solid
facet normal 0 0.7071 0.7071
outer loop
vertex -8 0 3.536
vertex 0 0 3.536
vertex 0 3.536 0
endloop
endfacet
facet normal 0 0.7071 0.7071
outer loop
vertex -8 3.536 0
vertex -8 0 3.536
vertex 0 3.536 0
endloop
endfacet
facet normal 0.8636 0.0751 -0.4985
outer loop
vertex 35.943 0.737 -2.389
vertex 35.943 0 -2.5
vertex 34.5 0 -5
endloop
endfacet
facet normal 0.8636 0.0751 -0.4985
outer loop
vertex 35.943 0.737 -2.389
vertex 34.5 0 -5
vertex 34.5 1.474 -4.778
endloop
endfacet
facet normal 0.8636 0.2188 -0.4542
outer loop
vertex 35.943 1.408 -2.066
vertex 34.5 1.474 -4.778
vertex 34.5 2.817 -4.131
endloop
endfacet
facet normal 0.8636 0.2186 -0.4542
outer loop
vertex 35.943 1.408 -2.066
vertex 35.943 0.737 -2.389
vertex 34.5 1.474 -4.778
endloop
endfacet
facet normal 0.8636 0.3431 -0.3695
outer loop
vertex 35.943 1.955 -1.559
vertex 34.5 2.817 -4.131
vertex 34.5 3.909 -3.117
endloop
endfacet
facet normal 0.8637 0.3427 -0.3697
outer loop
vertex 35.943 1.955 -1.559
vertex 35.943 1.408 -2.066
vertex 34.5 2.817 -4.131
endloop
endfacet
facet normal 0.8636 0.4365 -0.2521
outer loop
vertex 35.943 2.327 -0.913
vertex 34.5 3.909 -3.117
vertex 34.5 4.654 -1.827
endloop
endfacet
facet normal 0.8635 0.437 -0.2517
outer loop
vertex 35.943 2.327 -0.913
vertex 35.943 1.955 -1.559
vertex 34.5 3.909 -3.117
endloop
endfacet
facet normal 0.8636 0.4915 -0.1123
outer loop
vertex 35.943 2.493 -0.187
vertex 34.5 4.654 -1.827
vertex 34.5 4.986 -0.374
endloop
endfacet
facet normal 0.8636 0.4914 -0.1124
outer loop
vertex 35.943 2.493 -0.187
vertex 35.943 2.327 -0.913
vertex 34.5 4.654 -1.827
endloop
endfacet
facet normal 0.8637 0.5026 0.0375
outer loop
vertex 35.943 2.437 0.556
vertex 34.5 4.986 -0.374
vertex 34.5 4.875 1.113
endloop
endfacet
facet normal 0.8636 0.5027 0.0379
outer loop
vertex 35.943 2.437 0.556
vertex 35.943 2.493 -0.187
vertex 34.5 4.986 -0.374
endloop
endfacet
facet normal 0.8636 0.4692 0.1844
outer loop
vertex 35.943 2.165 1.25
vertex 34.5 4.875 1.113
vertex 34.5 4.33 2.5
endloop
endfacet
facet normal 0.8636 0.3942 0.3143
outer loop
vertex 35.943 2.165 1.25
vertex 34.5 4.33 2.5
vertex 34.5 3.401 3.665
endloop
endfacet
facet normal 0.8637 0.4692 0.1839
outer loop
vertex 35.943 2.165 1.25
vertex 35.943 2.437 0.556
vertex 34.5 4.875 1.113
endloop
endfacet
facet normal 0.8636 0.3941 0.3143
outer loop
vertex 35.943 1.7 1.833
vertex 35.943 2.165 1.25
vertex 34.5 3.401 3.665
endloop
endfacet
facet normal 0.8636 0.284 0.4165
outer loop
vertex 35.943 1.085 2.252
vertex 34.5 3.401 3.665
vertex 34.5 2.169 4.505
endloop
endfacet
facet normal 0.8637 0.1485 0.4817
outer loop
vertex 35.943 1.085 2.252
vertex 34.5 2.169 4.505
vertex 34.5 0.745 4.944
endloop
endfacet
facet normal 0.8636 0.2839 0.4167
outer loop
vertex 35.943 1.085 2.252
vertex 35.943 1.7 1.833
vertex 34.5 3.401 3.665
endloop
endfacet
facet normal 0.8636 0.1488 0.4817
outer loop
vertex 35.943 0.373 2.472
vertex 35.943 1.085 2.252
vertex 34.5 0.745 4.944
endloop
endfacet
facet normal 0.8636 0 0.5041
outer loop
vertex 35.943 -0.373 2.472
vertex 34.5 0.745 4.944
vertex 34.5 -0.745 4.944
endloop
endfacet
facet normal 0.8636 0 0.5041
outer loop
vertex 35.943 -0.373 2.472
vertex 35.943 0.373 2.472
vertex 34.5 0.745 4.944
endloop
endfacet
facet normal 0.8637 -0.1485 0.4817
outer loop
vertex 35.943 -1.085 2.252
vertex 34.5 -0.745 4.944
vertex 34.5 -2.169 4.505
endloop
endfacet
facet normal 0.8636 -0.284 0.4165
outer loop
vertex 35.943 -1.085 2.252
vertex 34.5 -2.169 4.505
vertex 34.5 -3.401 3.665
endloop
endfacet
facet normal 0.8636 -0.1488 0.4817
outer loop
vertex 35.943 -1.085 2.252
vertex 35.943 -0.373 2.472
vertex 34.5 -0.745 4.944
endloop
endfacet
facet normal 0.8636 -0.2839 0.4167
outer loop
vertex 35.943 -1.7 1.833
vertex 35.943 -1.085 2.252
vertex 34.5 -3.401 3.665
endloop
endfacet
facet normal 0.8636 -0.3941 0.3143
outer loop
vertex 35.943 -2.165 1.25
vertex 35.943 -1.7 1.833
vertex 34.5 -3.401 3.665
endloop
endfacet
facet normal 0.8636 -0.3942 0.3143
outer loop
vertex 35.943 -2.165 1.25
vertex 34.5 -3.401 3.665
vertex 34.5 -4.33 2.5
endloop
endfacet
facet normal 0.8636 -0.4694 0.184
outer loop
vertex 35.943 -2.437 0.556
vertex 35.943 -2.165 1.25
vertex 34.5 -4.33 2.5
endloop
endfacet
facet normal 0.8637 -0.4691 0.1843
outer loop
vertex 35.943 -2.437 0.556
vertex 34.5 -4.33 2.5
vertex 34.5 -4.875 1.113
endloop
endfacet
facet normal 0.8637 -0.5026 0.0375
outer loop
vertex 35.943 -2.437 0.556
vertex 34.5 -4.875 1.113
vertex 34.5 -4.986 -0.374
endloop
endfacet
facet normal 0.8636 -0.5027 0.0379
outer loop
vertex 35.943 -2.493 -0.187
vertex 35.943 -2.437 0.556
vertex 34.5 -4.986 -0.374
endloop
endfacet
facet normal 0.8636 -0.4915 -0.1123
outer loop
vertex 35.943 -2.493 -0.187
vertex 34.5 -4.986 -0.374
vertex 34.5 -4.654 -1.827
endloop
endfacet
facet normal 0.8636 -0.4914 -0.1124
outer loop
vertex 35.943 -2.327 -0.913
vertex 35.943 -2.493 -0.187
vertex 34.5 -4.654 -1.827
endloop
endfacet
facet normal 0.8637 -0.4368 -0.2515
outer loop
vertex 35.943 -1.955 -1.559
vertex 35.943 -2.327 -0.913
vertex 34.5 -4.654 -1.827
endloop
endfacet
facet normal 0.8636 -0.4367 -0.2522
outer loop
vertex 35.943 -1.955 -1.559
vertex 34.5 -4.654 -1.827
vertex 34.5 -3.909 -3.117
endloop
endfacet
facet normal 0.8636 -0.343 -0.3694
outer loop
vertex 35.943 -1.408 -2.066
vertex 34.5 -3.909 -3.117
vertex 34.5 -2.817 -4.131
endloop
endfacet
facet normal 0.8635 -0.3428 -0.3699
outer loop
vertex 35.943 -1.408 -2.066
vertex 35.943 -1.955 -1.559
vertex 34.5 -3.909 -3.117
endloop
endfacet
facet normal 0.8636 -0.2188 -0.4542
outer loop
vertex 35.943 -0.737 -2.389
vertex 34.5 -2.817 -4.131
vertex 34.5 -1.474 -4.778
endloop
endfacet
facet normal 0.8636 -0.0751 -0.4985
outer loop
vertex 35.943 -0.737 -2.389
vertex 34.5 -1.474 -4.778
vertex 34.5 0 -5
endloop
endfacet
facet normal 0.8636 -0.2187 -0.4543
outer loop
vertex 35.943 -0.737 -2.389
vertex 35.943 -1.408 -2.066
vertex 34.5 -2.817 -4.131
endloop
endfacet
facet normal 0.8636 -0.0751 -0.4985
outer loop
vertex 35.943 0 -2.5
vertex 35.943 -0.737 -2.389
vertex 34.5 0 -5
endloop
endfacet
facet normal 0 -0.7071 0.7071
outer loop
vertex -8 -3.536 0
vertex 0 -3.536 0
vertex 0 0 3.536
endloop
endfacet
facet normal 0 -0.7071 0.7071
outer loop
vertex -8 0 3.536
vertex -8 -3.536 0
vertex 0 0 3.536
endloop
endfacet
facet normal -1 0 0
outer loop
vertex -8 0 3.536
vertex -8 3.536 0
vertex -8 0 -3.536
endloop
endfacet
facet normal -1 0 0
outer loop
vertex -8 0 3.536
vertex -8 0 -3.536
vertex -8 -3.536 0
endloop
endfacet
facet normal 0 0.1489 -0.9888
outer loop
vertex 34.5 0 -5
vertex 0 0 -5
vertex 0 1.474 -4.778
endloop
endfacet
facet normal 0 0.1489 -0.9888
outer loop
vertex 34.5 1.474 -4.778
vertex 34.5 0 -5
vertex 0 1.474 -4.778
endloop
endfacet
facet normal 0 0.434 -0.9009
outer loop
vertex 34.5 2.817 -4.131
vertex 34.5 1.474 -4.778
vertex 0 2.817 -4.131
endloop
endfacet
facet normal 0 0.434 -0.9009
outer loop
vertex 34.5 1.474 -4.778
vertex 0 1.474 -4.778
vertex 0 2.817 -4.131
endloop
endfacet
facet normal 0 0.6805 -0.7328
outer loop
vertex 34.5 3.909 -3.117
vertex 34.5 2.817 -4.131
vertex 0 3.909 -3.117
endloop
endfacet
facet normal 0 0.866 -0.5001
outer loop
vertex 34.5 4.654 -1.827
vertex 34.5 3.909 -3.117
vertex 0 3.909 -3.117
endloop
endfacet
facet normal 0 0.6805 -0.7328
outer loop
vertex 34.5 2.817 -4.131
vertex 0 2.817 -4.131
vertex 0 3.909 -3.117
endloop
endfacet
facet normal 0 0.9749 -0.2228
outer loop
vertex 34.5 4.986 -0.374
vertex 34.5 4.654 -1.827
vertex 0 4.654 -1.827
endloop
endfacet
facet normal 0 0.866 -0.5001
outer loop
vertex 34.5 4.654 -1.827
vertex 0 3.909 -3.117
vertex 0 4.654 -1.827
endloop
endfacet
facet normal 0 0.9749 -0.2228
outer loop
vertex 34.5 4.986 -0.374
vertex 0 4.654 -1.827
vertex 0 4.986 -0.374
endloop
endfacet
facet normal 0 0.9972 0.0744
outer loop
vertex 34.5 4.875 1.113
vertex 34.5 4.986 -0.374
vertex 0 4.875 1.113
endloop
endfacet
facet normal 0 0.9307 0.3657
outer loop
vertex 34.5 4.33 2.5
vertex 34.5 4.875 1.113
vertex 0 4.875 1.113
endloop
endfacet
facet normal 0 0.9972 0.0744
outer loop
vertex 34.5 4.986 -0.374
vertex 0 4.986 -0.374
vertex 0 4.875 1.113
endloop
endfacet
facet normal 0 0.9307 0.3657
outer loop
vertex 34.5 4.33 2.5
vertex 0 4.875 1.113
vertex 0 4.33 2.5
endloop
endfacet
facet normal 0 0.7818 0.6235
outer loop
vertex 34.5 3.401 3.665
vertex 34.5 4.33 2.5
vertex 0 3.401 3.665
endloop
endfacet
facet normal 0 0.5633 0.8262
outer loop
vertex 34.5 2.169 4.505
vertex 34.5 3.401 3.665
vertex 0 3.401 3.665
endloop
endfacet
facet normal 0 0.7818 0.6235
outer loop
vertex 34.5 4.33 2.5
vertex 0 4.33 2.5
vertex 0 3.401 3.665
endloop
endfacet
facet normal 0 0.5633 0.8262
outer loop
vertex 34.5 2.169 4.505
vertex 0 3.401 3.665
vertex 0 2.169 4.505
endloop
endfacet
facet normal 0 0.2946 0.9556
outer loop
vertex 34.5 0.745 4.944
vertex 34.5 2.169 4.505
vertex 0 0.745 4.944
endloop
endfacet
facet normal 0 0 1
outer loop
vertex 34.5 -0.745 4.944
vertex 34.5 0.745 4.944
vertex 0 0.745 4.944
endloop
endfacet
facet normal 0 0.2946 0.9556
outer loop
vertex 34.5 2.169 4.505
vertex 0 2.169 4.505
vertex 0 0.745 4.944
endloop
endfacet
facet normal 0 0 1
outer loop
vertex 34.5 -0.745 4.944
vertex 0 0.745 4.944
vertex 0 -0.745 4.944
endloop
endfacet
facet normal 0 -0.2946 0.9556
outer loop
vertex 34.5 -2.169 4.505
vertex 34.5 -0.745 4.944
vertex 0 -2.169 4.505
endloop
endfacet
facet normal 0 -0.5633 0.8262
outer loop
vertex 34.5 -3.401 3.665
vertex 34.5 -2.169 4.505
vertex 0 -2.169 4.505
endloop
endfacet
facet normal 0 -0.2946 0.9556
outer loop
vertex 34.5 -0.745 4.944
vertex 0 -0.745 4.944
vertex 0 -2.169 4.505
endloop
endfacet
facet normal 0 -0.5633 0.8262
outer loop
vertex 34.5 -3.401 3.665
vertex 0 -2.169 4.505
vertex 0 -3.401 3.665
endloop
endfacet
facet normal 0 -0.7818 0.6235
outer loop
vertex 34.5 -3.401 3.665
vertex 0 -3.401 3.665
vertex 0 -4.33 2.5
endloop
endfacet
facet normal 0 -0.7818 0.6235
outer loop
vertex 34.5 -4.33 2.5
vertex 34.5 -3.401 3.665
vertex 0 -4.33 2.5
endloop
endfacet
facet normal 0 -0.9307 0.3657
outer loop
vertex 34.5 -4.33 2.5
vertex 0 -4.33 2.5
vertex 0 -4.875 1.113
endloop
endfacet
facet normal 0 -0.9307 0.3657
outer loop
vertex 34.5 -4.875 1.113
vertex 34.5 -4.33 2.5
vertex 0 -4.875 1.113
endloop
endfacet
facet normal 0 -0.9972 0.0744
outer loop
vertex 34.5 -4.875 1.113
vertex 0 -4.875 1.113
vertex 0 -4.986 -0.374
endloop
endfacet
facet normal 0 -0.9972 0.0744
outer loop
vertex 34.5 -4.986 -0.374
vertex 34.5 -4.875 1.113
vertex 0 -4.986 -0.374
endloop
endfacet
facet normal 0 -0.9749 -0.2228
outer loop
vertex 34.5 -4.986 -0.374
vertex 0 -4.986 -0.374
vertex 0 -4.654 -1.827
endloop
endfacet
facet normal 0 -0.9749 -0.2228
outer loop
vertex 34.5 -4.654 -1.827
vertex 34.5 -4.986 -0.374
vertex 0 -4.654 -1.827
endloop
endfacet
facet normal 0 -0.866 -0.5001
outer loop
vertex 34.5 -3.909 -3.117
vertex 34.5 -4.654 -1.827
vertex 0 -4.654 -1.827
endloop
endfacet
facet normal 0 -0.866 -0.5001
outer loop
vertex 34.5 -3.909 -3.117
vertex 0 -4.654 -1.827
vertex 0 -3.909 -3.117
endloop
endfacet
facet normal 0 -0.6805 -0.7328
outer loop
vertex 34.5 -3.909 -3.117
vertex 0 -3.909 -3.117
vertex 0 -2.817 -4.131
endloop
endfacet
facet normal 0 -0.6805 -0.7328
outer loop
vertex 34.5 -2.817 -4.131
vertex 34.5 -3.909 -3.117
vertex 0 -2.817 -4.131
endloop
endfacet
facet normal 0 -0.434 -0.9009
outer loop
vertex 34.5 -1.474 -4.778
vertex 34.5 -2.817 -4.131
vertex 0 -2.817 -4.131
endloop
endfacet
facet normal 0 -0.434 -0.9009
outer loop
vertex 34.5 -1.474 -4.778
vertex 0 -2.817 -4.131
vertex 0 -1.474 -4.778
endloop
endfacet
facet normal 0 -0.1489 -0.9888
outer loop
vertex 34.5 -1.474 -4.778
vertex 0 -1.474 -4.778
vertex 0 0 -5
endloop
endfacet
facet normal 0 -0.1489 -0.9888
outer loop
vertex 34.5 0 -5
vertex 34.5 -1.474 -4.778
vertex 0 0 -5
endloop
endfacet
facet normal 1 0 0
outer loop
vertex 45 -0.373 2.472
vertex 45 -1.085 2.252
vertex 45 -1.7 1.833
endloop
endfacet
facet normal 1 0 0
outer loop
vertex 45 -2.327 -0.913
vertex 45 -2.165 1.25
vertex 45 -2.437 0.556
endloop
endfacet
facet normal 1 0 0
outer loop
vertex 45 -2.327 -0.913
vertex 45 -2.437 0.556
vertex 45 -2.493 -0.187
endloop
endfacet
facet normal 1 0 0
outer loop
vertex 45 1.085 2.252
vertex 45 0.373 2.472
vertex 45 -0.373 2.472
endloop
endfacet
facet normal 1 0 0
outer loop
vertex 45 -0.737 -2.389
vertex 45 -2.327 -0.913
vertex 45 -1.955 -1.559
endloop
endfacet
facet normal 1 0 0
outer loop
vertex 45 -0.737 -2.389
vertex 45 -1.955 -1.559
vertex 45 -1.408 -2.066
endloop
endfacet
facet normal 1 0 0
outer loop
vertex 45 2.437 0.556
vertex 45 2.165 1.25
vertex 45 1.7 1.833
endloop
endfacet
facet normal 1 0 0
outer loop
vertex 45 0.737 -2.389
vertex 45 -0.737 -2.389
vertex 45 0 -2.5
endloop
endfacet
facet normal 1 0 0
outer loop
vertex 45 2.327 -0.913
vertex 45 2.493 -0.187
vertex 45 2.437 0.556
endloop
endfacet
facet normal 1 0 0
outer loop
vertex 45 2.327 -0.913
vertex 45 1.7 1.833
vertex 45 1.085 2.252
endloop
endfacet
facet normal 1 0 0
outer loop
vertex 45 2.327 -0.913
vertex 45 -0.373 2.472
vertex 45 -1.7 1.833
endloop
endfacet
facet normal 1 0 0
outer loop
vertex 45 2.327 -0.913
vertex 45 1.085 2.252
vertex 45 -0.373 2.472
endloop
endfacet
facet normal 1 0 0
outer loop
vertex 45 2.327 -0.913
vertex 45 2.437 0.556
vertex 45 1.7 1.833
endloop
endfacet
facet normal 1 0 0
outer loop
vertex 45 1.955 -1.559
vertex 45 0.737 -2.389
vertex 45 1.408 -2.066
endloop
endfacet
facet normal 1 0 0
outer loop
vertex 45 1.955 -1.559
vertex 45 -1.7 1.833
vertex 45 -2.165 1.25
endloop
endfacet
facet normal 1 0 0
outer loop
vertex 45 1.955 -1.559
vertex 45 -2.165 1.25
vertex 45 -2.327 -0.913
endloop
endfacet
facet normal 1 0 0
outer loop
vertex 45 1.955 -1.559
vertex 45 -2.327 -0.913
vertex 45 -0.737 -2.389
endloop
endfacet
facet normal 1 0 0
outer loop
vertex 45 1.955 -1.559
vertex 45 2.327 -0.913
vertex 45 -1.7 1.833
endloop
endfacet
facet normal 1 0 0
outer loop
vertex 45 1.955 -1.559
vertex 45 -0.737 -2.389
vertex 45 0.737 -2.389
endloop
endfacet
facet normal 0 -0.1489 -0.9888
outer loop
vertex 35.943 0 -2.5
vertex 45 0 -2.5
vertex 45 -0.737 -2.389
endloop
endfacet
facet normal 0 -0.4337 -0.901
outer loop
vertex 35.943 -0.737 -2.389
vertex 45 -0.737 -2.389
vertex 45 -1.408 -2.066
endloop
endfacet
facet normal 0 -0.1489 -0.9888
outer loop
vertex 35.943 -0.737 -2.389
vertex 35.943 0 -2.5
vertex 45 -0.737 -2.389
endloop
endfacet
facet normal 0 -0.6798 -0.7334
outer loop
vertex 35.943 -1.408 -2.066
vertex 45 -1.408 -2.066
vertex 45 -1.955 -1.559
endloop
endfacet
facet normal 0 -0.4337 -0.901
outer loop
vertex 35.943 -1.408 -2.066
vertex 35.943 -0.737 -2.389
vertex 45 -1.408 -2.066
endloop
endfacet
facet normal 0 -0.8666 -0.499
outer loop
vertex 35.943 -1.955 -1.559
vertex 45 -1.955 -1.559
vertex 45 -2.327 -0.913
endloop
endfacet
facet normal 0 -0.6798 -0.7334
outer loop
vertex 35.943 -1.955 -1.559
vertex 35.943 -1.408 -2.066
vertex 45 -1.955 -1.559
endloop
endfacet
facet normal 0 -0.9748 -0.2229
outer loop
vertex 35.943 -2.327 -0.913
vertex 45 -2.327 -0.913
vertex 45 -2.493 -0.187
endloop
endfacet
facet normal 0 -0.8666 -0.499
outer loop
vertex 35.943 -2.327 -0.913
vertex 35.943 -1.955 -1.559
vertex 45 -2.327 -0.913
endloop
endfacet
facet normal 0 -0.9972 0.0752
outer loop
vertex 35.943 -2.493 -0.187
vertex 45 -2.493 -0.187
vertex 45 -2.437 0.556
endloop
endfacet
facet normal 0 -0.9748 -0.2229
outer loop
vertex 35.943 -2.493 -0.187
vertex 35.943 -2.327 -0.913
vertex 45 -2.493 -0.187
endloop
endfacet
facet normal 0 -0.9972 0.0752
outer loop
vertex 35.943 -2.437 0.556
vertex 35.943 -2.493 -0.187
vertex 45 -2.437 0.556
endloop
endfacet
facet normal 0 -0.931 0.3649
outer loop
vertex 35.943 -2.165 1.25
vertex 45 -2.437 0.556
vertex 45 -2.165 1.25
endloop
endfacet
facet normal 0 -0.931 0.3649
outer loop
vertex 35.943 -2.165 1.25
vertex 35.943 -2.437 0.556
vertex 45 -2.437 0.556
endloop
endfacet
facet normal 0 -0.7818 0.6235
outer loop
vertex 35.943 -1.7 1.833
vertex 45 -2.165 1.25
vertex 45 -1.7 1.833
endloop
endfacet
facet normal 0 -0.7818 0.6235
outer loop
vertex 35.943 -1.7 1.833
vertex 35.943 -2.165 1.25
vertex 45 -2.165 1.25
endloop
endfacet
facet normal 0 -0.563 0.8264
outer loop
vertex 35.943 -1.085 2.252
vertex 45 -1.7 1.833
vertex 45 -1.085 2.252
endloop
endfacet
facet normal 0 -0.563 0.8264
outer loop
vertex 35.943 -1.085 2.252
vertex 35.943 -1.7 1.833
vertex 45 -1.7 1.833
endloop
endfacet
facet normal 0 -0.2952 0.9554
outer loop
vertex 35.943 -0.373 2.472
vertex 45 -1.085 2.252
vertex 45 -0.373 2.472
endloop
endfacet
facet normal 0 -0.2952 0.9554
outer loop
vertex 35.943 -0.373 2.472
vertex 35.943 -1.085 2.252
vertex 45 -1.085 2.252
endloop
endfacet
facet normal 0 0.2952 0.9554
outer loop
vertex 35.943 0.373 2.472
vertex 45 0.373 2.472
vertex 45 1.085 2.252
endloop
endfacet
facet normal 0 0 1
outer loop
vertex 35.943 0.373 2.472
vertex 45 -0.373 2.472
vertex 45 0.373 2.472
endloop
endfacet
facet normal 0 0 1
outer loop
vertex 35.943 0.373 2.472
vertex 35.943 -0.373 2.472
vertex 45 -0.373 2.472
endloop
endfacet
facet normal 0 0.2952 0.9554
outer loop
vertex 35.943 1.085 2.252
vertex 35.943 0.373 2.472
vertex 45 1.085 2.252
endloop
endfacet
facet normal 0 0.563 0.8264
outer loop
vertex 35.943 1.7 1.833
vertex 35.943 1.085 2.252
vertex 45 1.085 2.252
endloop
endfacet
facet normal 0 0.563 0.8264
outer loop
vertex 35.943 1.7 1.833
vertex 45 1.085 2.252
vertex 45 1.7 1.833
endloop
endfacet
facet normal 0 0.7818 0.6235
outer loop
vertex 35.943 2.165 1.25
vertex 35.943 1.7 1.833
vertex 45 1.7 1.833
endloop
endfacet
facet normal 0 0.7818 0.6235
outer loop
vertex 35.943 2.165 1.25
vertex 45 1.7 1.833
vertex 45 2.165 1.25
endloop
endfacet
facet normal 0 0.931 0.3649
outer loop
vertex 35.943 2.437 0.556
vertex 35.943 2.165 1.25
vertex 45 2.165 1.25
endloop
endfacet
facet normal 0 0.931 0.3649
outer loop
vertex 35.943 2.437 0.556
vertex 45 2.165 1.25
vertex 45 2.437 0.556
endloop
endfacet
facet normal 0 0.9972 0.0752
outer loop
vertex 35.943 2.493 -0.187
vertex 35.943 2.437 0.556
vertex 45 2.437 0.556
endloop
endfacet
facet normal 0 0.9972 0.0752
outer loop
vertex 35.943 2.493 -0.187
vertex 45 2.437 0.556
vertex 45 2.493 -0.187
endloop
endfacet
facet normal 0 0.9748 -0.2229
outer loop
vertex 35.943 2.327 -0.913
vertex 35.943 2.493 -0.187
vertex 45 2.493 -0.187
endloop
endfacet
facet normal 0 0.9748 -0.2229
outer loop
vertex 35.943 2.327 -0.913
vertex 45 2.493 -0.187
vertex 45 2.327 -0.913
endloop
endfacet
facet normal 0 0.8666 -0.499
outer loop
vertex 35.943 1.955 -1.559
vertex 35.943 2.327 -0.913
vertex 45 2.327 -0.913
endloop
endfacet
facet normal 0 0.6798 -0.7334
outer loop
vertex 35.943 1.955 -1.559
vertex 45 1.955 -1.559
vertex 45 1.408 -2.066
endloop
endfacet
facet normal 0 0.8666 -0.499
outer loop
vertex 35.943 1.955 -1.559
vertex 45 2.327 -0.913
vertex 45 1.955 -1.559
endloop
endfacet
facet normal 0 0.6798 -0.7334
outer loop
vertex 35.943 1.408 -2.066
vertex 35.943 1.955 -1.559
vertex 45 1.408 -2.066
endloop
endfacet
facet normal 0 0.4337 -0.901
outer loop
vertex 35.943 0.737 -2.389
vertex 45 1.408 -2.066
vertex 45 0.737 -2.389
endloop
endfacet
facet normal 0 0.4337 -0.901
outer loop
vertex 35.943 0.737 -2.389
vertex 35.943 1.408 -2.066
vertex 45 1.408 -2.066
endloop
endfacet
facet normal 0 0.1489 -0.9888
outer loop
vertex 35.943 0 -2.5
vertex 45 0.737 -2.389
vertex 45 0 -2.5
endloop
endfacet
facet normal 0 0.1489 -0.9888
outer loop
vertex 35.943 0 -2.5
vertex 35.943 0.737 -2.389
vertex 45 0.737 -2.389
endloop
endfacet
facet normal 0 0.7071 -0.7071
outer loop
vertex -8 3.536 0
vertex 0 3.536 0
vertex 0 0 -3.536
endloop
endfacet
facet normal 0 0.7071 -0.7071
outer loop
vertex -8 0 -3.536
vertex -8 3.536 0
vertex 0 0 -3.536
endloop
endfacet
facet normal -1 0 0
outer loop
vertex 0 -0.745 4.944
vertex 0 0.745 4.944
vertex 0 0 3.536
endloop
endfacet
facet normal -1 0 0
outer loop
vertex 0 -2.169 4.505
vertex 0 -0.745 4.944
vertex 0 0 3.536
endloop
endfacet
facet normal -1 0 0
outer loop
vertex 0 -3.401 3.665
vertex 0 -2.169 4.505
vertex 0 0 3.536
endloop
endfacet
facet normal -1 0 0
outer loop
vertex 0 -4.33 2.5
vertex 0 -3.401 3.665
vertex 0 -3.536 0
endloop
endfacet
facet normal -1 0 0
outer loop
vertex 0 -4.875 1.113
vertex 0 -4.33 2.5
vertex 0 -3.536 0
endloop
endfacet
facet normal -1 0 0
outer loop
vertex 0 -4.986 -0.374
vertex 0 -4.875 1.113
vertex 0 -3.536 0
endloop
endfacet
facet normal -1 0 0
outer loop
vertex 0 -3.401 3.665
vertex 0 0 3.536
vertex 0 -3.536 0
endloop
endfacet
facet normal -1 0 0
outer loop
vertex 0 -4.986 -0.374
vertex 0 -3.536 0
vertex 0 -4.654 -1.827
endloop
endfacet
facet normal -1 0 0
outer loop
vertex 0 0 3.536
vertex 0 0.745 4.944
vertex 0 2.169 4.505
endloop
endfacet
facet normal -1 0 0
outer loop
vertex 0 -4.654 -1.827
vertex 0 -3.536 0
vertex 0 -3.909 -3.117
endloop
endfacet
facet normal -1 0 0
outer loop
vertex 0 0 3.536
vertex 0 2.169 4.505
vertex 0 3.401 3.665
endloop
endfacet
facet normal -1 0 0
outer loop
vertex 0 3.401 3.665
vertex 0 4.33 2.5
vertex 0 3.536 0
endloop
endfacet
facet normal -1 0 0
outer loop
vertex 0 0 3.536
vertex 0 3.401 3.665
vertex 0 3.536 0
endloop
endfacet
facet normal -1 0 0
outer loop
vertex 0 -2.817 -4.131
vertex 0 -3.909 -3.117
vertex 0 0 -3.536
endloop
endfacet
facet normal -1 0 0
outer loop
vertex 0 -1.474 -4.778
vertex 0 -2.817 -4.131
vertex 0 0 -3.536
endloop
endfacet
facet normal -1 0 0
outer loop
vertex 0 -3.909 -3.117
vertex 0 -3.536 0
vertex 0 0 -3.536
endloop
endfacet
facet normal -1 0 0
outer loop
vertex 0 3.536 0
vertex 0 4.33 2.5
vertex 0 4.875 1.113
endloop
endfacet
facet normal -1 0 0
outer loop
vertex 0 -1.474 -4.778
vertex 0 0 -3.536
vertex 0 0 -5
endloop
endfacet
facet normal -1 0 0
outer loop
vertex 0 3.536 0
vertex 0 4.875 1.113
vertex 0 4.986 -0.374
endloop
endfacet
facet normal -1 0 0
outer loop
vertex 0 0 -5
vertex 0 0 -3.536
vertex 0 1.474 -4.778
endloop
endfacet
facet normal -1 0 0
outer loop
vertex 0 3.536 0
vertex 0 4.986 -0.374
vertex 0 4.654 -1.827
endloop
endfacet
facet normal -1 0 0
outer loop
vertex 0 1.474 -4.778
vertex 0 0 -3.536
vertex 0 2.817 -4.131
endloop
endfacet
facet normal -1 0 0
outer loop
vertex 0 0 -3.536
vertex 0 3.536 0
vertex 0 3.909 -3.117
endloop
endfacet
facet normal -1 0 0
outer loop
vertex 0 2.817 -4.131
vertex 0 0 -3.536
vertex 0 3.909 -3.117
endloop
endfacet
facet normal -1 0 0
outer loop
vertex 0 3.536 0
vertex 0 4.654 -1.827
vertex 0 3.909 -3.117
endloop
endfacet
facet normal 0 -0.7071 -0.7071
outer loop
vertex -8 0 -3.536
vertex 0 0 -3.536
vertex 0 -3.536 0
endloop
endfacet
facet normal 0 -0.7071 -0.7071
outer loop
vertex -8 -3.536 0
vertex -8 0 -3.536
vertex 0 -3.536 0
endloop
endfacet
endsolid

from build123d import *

# Parameters (mm, degrees)
SKETCH_1_R       = 5
EXTRUDE_1_DEPTH  = 37
SKETCH_2_R       = 2.5
EXTRUDE_2_DEPTH  = 8
EXTRUDE_3_DEPTH  = 8
CHAMFER_1_SIZE   = 2.5
CHAMFER_1_SIZE_2 = 4.330127019


with BuildPart() as part:
    # 草图1 → 凸台-拉伸1 (new body)
    with BuildSketch(Plane(origin=(0, 0, 0), x_dir=(0, 0, -1), z_dir=(1, 0, 0))):
        Circle(SKETCH_1_R)
    extrude(amount=EXTRUDE_1_DEPTH)

    # 草图2 → 凸台-拉伸2 (add)
    with BuildSketch(Plane(origin=(37, 0, 0), x_dir=(0, 0, -1), z_dir=(1, 0, 0))):
        Circle(SKETCH_2_R)
    extrude(amount=EXTRUDE_2_DEPTH)

    # 草图3 → 凸台-拉伸3 (add)
    with BuildSketch(Plane.ZY):
        Polygon((0, 3.535533906), (-3.535533906, 0), (0, -3.535533906), (3.535533906, 0), align=None)
    extrude(amount=EXTRUDE_3_DEPTH)

    # 倒角1
    # the kernel refuses this chamfer: 4.330127019, 2.5 mm, written as the material it takes off along each edge
    with BuildSketch(Plane(origin=(37, 0, 0), x_dir=(0, 0, -1), z_dir=(0, -1, 0))) as chamfer_1_piece_1_section:
        Polygon((5, -CHAMFER_1_SIZE), (5 - CHAMFER_1_SIZE_2, 0), (5, 0), align=None)
    chamfer_1_piece_1 = revolve(axis=Axis((37, 0, 0), (1, 0, 0)), mode=Mode.PRIVATE)
    chamfer_1_piece_1 = chamfer_1_piece_1 - Plane(origin=(35.221489766, 0, 0), x_dir=(0, 0, -1), z_dir=(-1, 0, 0)) * Cylinder(2.5, 20, mode=Mode.PRIVATE)
    add(chamfer_1_piece_1, mode=Mode.SUBTRACT)


solid = part.part
